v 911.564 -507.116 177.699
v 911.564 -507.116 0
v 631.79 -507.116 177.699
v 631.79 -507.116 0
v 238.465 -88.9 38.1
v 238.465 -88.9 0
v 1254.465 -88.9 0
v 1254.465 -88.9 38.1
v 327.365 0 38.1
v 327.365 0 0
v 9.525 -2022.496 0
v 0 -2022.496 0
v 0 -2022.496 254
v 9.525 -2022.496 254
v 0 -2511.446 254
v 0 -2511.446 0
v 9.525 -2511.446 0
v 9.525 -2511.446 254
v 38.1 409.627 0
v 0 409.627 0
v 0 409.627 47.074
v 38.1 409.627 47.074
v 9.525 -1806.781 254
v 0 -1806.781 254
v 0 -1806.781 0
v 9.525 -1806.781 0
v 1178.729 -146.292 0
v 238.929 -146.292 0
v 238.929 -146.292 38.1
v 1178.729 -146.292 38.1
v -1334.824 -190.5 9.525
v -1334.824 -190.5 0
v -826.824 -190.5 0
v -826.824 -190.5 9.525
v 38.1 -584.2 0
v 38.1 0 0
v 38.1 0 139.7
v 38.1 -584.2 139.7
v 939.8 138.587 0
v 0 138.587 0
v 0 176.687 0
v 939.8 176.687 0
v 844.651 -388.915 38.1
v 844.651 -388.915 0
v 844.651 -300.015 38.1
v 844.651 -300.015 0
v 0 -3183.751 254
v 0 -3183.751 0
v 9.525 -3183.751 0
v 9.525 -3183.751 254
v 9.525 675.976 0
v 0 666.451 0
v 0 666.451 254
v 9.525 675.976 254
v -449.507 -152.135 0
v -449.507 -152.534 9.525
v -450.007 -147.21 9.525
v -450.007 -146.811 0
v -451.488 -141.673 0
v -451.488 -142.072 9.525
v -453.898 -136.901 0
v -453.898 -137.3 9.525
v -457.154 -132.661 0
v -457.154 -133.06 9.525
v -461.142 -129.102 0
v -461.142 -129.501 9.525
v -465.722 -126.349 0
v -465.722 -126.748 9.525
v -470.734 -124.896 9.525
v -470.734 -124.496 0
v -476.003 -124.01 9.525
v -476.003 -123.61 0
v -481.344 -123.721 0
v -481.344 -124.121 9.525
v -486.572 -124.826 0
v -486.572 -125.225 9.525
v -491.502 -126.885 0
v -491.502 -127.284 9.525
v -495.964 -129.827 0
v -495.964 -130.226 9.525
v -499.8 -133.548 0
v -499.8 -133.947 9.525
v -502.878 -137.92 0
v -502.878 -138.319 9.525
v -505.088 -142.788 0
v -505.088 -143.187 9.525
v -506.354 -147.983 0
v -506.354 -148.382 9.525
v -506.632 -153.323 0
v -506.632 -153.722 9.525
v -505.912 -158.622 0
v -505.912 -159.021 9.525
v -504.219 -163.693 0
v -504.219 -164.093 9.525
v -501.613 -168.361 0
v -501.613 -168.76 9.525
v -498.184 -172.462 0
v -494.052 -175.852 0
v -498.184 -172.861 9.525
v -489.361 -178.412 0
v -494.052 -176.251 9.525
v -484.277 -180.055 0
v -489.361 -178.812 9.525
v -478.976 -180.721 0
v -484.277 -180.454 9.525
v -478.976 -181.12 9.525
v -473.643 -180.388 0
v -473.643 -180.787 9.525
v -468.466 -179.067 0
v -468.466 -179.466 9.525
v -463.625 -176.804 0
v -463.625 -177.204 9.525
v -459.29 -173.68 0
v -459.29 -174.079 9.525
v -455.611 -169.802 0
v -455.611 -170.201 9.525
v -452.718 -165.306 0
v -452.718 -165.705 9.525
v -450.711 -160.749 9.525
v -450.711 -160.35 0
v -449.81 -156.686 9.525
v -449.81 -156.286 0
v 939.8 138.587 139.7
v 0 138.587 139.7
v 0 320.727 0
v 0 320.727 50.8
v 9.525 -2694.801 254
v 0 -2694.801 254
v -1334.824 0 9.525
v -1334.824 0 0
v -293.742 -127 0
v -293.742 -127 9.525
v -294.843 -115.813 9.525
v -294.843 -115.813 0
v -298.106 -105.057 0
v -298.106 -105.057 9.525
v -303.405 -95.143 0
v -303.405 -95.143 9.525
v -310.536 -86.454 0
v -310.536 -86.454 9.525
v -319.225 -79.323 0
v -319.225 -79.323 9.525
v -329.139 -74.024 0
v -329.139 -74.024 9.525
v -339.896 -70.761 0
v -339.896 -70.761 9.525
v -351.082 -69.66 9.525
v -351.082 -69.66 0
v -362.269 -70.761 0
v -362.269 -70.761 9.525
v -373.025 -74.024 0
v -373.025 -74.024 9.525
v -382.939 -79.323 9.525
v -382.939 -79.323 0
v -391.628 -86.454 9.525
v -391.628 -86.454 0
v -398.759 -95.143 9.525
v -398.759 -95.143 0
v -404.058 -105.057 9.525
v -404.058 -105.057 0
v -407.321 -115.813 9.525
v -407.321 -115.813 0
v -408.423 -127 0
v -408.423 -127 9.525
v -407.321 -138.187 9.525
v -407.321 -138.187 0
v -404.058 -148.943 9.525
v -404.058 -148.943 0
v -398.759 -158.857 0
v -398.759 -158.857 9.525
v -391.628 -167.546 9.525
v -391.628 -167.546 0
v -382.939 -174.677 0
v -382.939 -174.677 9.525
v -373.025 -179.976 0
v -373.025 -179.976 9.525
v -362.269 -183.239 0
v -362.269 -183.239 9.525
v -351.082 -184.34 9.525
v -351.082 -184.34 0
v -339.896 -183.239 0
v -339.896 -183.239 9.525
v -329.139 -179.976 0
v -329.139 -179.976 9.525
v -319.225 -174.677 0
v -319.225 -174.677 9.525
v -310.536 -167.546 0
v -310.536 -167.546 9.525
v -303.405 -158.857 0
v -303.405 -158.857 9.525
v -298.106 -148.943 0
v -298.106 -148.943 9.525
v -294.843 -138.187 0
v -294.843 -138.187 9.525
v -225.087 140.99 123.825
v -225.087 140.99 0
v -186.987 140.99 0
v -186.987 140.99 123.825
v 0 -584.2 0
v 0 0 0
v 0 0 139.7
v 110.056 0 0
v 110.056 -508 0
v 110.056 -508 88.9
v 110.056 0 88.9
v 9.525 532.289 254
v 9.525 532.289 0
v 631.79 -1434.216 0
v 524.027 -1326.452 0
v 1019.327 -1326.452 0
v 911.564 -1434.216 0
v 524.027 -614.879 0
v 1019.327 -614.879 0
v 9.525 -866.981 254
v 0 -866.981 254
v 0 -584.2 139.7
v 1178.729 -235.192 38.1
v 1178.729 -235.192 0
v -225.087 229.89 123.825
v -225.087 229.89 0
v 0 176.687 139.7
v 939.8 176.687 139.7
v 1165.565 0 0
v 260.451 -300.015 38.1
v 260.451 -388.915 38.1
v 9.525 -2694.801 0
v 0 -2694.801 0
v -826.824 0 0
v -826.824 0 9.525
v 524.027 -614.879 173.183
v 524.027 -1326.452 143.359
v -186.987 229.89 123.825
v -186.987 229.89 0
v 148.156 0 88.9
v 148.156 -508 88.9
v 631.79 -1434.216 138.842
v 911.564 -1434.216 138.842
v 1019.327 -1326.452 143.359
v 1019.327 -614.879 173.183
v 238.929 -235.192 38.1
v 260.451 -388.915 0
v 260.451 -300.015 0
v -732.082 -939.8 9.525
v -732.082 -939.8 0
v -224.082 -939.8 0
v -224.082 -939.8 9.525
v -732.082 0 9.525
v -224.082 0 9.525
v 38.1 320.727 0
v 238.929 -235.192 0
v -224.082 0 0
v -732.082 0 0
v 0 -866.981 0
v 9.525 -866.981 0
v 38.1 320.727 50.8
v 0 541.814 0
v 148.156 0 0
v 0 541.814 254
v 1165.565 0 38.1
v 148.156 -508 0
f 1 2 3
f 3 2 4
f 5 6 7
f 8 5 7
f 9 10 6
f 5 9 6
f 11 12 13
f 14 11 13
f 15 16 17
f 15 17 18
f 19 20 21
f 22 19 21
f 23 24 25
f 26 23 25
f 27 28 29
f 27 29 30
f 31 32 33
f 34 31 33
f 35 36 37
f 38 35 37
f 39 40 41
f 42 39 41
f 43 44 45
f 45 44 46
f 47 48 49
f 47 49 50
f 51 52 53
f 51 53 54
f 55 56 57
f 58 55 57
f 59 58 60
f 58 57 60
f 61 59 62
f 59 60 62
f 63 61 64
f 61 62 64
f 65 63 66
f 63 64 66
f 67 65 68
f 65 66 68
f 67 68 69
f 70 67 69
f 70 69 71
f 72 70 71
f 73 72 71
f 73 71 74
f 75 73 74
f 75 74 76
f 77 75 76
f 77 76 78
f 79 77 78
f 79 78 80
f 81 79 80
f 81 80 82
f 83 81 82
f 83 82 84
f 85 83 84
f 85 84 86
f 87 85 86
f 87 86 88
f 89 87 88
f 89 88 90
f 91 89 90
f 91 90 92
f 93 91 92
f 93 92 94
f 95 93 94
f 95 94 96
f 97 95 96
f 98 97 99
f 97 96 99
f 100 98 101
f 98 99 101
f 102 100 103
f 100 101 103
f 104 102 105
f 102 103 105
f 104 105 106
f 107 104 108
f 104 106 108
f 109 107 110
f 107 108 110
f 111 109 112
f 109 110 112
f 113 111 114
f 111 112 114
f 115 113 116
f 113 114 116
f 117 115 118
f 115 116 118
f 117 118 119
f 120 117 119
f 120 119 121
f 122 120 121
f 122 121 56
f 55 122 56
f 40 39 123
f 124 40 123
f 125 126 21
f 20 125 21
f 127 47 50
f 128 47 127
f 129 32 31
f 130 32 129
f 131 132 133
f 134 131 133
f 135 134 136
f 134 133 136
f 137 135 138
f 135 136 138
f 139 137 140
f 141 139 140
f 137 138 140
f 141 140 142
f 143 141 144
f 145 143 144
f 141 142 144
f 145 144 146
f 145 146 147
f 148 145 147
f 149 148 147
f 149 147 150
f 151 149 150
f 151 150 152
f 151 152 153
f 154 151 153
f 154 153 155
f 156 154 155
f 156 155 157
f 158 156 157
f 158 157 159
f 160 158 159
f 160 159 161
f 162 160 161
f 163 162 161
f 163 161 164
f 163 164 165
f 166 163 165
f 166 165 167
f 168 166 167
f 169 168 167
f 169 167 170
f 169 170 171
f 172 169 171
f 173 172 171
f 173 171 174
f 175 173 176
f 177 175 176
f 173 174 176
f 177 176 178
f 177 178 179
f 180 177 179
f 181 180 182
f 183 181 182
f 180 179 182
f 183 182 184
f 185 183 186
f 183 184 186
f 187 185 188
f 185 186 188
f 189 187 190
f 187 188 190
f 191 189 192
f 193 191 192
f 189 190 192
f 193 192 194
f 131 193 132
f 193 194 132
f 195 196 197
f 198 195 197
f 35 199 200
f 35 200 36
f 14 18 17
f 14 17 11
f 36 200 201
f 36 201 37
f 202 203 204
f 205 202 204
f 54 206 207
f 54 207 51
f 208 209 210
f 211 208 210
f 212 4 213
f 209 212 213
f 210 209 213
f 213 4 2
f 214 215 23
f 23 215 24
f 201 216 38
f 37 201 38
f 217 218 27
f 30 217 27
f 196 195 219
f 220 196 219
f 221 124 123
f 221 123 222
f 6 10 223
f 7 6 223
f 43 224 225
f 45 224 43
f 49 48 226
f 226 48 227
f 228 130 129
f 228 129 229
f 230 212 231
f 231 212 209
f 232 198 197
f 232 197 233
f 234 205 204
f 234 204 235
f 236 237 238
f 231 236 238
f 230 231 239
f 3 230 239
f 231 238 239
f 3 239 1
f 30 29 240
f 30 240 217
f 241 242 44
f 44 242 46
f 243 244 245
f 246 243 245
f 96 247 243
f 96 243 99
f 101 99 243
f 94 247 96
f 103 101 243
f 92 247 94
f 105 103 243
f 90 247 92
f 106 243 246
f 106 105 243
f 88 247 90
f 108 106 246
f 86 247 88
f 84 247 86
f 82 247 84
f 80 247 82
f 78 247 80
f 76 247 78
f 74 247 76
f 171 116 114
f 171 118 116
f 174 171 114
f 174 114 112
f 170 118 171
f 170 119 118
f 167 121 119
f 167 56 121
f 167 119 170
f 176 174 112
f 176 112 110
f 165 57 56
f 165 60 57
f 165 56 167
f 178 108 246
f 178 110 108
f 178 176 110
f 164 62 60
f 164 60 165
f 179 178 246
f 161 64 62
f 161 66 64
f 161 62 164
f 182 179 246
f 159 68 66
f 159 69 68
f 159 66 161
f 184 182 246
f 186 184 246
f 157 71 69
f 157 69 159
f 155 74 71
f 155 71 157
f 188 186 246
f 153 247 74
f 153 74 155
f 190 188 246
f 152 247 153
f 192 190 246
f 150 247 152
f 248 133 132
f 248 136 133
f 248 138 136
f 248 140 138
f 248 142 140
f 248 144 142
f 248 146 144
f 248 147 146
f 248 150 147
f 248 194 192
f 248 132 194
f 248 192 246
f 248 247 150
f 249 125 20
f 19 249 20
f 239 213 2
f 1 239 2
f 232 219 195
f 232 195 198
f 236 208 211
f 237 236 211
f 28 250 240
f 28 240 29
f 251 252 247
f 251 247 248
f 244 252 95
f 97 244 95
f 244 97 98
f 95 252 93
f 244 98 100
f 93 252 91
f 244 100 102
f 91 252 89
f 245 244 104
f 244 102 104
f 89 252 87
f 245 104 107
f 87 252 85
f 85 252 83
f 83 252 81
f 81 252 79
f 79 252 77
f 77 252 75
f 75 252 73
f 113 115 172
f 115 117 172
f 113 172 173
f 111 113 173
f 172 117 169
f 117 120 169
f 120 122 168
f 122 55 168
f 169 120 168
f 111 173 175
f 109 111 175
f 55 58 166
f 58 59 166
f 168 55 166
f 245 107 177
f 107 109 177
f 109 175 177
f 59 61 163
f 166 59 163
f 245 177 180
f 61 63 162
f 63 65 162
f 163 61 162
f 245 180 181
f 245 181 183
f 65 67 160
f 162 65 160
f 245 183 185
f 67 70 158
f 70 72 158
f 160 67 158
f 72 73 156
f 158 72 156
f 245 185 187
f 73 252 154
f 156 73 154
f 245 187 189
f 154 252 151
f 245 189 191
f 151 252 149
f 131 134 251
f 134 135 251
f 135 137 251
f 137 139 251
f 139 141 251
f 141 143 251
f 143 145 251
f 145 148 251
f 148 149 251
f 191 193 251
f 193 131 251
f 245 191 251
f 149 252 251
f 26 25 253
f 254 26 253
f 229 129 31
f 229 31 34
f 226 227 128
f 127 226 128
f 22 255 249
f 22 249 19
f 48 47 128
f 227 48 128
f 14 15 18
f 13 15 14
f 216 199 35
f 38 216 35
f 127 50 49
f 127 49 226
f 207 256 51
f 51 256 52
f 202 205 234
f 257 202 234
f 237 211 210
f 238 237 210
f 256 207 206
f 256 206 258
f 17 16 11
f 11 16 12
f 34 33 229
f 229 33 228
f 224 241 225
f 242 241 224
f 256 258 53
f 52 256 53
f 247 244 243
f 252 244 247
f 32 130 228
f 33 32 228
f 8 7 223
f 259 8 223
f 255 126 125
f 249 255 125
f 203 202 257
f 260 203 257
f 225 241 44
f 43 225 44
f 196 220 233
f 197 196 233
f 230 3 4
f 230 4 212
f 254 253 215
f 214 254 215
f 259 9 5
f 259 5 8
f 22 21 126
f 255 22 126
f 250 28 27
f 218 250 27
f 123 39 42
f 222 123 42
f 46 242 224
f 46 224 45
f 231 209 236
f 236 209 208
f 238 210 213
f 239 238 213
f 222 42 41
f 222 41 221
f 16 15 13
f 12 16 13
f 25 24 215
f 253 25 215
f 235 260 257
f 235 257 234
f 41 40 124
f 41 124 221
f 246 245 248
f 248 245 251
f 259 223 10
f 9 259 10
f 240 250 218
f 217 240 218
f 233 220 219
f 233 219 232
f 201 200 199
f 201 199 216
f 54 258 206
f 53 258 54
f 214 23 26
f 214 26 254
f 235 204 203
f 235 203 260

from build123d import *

# Parameters (mm, degrees)
F0_W      = 38.1
F0_H      = 139.7
F1_DEPTH  = 584.2
F2_W      = 38.1
F2_H      = 139.7
F3_DEPTH  = 939.8
F4_W      = 38.1
F4_H      = 88.9
F5_DEPTH  = 508
F6_W      = 508
F6_H      = 939.8
F7_DEPTH  = 9.525
F8_W      = 508
F8_H      = 190.5
F9_DEPTH  = 9.525
F11_DEPTH = 9.525
F12_W     = 488.95
F12_H     = 254
F13_DEPTH = 9.525
F14_W     = 488.95
F14_H     = 254
F15_DEPTH = 9.525
F17_DEPTH = 38.1
F18_W     = 939.8
F18_H     = 88.9
F19_DEPTH = 38.1
F20_W     = 584.2
F20_H     = 88.9
F21_DEPTH = 38.1
F22_W     = 38.1
F22_H     = 88.9
F23_DEPTH = 123.825
F25_DEPTH = 38.1
F26_W     = 143.6878
F26_H     = 254
F27_DEPTH = 9.525
F29_DEPTH = 254
F31_R     = 28.575
F32_DEPTH = 76.2
F33_R     = 57.3405
F34_DEPTH = 25.4
F36_DEPTH = 177.8
F38_DEPTH = 508


with BuildPart() as f1:
    # F0 (on Front) → F1 (new body)
    with BuildSketch(Plane.XZ):
        with Locations((19.05, 69.85)):
            Rectangle(F0_W, F0_H)
    extrude(amount=F1_DEPTH)


with BuildPart() as f3:
    # F2 (on Right) → F3 (new body)
    with BuildSketch(Plane.YZ):
        with Locations((157.6366101078, 69.85)):
            Rectangle(F2_W, F2_H)
    extrude(amount=F3_DEPTH)


with BuildPart() as f5:
    # F4 (on Front) → F5 (new body)
    with BuildSketch(Plane.XZ):
        with Locations((129.1061491343, 44.45)):
            Rectangle(F4_W, F4_H)
    extrude(amount=F5_DEPTH)


with BuildPart() as f7:
    # F6 (on Top) → F7 (new body)
    with BuildSketch(Plane.XY):
        with Locations((-478.0821103561, -469.9)):
            Rectangle(F6_W, F6_H)
    extrude(amount=F7_DEPTH)

    # F31 (on face) → F32 (cut)
    with BuildSketch(Plane(origin=(0, -2.0465211675, 48.828515824), x_dir=(1, 0, 0), z_dir=(0, -0.0418756537, 0.9991228301))):
        with Locations((-478.0821103561, -152.0011343982)):
            Circle(F31_R)
    extrude(amount=-F32_DEPTH, mode=Mode.SUBTRACT)

    # F33 (on face) → F34 (cut)
    with BuildSketch(Plane.XY.offset(9.525)):
        with Locations((-351.0821103561, -127)):
            Circle(F33_R)
    extrude(amount=-F34_DEPTH, mode=Mode.SUBTRACT)


with BuildPart() as f9:
    # F8 (on Top) → F9 (new body)
    with BuildSketch(Plane.XY):
        with Locations((-1080.8238734909, -95.25)):
            Rectangle(F8_W, F8_H)
    extrude(amount=F9_DEPTH)


with BuildPart() as f11:
    # F10 (on Right) → F11 (new body)
    with BuildSketch(Plane.YZ):
        Polygon((-1616.2810644211, 0), (-866.9810644211, 0), (-866.9810644211, 254), (-1806.7810644211, 254), (-1806.7810644211, 0), align=None)
    extrude(amount=F11_DEPTH)


with BuildPart() as f13:
    # F12 (on Right) → F13 (new body)
    with BuildSketch(Plane.YZ):
        with Locations((-2266.9705320059, 127)):
            Rectangle(F12_W, F12_H)
    extrude(amount=F13_DEPTH)


with BuildPart() as f15:
    # F14 (on Right) → F15 (new body)
    with BuildSketch(Plane.YZ):
        with Locations((-2939.2763446808, 127)):
            Rectangle(F14_W, F14_H)
    extrude(amount=F15_DEPTH)


with BuildPart() as f17:
    # F16 (on Top) → F17 (new body)
    with BuildSketch(Plane.XY):
        Polygon((1165.5650138855, 0), (327.3650138855, 0), (238.4650138855, -88.9), (1254.4650138855, -88.9), align=None)
    extrude(amount=F17_DEPTH)


with BuildPart() as f19:
    # F18 (on Top) → F19 (new body)
    with BuildSketch(Plane.XY):
        with Locations((708.8293251634, -190.7424614228)):
            Rectangle(F18_W, F18_H)
    extrude(amount=F19_DEPTH)


with BuildPart() as f21:
    # F20 (on Top) → F21 (new body)
    with BuildSketch(Plane.XY):
        with Locations((552.5514217973, -344.4653765084)):
            Rectangle(F20_W, F20_H)
    extrude(amount=F21_DEPTH)


with BuildPart() as f23:
    # F22 (on Top) → F23 (new body)
    with BuildSketch(Plane.XY):
        with Locations((-206.0373872519, 185.4401671906)):
            Rectangle(F22_W, F22_H)
    extrude(amount=F23_DEPTH)


with BuildPart() as f25:
    # F24 (on Right) → F25 (new body)
    with BuildSketch(Plane.YZ):
        Polygon((320.7268421526, 50.8), (320.7268421526, 0), (409.6268421526, 0), (409.6268421526, 47.0739860362), align=None)
    extrude(amount=F25_DEPTH)


with BuildPart() as f27:
    # F26 (on Right) → F27 (new body)
    with BuildSketch(Plane.YZ):
        with Locations((604.1324300841, 127)):
            Rectangle(F26_W, F26_H)
    extrude(amount=F27_DEPTH)

    # F28 (on face) → F29 (cut)
    with BuildSketch(Plane.XY.offset(254)):
        Polygon((0, 666.4513300841), (9.525, 675.9763300841), (0, 675.9763300841), align=None)
        Polygon((0, 532.2885300841), (9.525, 532.2885300841), (0, 541.8135300841), align=None)
    extrude(amount=-F29_DEPTH, mode=Mode.SUBTRACT)


with BuildPart() as f36:
    # F35 (on Top) → F36 (new body)
    with BuildSketch(Plane.XY):
        Polygon((1019.3269744234, -614.8785839685), (911.5639009706, -507.1155105157), (631.7900478763, -507.1155105157), (524.0269744234, -614.8785839685), (524.0269744234, -1326.4524370629), (631.7900478763, -1434.2155105157), (911.5639009706, -1434.2155105157), (1019.3269744234, -1326.4524370629), align=None)
    extrude(amount=F36_DEPTH)

    # F37 (on face) → F38 (cut)
    with BuildSketch(Plane.YZ.offset(1019.3269744234)):
        Polygon((-504.7124624252, 177.8), (-614.8785839685, 177.8), (-614.8785839685, 173.1826714599), align=None)
        Polygon((-614.8785839685, 173.1826714599), (-614.8785839685, 177.8), (-1326.4524370629, 177.8), (-1326.4524370629, 143.3588906622), align=None)
        Polygon((-1326.4524370629, 143.3588906622), (-1326.4524370629, 177.8), (-1456.6290378571, 177.8), (-1454.3387185189, 137.9988673721), align=None)
    extrude(amount=-F38_DEPTH, mode=Mode.SUBTRACT)


solid = Compound([f1.part, f3.part, f5.part, f7.part, f9.part, f11.part, f13.part, f15.part, f17.part, f19.part, f21.part, f23.part, f25.part, f27.part, f36.part])
